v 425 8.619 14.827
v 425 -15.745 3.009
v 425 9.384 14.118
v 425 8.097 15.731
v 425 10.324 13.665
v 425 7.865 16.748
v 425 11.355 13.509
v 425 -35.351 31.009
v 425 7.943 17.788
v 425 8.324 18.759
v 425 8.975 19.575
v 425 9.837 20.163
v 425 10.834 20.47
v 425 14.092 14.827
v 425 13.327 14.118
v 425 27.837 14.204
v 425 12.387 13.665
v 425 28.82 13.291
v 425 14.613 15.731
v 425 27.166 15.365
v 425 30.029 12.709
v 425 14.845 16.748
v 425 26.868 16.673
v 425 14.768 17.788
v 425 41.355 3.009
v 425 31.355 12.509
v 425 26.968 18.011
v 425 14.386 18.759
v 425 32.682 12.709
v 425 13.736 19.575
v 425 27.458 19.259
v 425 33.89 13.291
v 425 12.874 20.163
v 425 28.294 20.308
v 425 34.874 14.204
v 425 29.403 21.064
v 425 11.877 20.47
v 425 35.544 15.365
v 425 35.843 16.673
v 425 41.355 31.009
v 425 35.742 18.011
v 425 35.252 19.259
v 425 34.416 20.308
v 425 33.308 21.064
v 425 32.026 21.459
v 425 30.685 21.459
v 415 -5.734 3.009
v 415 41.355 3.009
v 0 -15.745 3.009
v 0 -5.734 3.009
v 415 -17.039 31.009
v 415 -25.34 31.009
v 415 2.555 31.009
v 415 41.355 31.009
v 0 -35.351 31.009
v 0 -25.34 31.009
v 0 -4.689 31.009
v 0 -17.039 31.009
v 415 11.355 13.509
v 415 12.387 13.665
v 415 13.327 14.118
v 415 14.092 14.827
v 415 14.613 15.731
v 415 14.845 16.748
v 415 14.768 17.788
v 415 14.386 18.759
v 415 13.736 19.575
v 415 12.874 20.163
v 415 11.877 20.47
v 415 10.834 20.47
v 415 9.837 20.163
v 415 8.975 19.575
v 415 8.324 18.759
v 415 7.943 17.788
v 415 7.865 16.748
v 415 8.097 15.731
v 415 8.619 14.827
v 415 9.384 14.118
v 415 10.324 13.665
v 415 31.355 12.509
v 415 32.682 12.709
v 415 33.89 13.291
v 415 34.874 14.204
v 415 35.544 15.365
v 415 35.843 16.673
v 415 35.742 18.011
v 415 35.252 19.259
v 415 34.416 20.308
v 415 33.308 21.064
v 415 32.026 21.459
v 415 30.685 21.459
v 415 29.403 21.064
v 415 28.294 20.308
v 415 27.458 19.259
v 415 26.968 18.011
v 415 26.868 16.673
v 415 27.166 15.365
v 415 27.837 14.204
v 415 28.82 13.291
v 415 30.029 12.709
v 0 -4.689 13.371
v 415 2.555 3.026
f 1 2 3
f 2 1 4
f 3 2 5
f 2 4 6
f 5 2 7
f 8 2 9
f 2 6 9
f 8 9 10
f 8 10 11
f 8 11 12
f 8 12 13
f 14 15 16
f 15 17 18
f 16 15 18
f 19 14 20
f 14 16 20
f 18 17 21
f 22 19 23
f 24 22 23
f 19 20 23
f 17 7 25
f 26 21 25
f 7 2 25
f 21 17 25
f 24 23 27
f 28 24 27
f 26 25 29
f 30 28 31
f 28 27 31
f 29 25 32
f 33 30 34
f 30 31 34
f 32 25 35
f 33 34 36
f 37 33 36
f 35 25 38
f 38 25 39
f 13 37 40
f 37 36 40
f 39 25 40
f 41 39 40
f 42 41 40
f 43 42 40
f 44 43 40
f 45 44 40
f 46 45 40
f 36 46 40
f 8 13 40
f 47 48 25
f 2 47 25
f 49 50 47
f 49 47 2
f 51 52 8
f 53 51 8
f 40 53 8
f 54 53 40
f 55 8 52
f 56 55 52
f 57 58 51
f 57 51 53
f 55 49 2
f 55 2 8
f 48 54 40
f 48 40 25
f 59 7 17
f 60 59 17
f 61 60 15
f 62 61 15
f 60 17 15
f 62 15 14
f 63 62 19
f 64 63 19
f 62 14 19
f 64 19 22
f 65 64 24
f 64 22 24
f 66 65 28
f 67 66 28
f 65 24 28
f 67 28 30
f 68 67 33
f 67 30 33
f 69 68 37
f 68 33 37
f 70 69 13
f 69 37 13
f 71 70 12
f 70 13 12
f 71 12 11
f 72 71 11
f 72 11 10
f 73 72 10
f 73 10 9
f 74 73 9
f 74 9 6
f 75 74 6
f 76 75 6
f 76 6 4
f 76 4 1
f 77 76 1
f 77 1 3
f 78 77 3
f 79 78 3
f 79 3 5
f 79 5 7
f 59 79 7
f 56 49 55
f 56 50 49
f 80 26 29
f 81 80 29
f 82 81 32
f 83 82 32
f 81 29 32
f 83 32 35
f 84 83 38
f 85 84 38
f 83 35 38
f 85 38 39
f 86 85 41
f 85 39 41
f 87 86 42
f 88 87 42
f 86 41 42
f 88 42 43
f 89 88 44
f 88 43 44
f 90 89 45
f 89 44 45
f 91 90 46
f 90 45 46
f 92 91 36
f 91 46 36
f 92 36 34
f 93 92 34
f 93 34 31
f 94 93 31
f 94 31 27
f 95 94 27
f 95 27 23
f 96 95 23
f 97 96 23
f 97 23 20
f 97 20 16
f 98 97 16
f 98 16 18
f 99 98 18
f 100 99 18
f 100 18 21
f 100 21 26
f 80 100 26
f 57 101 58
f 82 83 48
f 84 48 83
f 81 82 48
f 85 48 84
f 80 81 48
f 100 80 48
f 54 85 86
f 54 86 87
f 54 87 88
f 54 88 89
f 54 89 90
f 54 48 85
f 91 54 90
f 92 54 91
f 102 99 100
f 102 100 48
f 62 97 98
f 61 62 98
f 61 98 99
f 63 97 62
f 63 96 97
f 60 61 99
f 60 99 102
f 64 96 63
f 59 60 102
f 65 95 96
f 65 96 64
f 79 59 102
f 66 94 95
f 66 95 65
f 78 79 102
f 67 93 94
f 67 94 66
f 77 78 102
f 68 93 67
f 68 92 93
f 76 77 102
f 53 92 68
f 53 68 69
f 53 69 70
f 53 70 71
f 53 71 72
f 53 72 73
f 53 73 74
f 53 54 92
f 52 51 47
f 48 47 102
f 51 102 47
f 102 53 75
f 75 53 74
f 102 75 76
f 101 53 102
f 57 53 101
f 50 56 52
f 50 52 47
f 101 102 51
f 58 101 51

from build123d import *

# Parameters (mm, degrees)
EXTRUDE_1_DEPTH     = 425
CUT_EXTRUDE_1_DEPTH = 425
SKETCH_4_R          = 4.5
SKETCH_4_R_2        = 3.5
CUT_EXTRUDE_2_DEPTH = 425
CUT_EXTRUDE_START   = -10
CUT_EXTRUDE_3_DEPTH = 415


with BuildPart() as part:
    # 草图1 → 凸台-拉伸1 (new body)
    with BuildSketch(Plane(origin=(0, 0, 0), x_dir=(0, 0, -1), z_dir=(1, 0, 0))):
        Polygon((-31.009476957, 41.355268582), (-3.009476957, 41.355268582), (-3.009476957, -15.744731418), (-31.009476957, -35.350542488), align=None)
    extrude(amount=EXTRUDE_1_DEPTH)

    # 草图2 → 切除-拉伸1 (cut)
    with BuildSketch(Plane.XY.offset(31.009476957)):
        Polygon((415, 41.355268582), (415, 2.555268582), (0, -4.688583363), (0, 41.355268582), align=None)
    extrude(amount=-CUT_EXTRUDE_1_DEPTH, mode=Mode.SUBTRACT)

    # 草图4 → 切除-拉伸2 (cut)
    with BuildSketch(Plane(origin=(425, 0, 0), x_dir=(0, 0, -1), z_dir=(1, 0, 0))):
        with Locations((-17.009476957, 31.355268582)):
            Circle(SKETCH_4_R)
        with Locations((-17.009476957, 11.355268582)):
            Circle(SKETCH_4_R_2)
    extrude(amount=-CUT_EXTRUDE_2_DEPTH, mode=Mode.SUBTRACT)

    # 草图6 → 切除-拉伸3 (cut)
    with BuildSketch(Plane(origin=(425, 0, 0), x_dir=(0, 0, -1), z_dir=(1, 0, 0)).offset(CUT_EXTRUDE_START)):
        Polygon((-31.009476957, -25.34019086), (-3.009476957, -5.73437979), (-3.009476957, 2.566887414), (-31.009476957, -17.038923656), align=None)
    extrude(amount=-CUT_EXTRUDE_3_DEPTH, mode=Mode.SUBTRACT)


solid = part.part
